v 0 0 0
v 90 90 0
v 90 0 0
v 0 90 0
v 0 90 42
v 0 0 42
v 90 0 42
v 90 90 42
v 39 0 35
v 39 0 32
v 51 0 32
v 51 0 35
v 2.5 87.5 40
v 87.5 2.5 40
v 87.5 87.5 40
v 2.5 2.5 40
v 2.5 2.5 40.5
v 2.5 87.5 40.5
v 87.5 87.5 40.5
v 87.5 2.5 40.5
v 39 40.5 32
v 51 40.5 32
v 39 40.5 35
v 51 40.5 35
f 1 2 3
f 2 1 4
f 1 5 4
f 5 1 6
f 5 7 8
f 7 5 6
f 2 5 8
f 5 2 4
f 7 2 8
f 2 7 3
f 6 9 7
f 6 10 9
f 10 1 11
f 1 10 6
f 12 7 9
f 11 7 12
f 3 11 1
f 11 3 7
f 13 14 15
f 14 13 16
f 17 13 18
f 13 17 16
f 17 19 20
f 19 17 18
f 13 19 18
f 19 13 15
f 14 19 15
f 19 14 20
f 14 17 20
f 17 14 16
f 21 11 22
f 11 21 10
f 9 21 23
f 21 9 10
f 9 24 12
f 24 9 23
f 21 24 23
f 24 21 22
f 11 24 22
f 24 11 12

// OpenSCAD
// Magnetic stirrer housing for an 80 mm PC case fan
// Print orientation: top plate on bed (z = 0), walls rise to z = 40, open top

// ---------- Parameters ----------
top_thickness      = 2;     // top plate thickness
wall_thickness     = 2.5;   // wall thickness
box_height         = 40;    // total height of walls (open top at z = 40)
outer_size         = 90;    // outer X and Y size of box
hole_count         = 4;     // number of mounting holes in top plate
hole_size          = 4.5;   // mounting hole diameter (M4)
hole_pitch         = 71.5;  // square pattern pitch between hole centres
notch_width        = 12;    // cable notch width, centred along one wall
notch_depth        = 8;     // notch depth from open edge (z = 32 to z = 40)
eps                = 0.5;   // overcut for clean boolean differences

$fn = 96;

// ---------- Derived ----------
inner_size = outer_size - 2 * wall_thickness;   // 85 x 85 mm open area
floor     = [outer_size, outer_size, 0];        // outer floor of top plate
ceiling   = [inner_size, inner_size, top_thickness]; // inner ceiling of top plate

// ---------- Model ----------
difference() {
    // Solid box: top plate + walls, open at the top
    translate([0, 0, 0])
        linear_extrude(height = box_height + top_thickness)
            square(outer_size);

    // Open the top: cut through the walls above z = box_height
    translate([wall_thickness, wall_thickness, box_height])
        linear_extrude(height = eps)
            square(inner_size);

    // Screw holes through the top plate, centred on the plate
    for (i = [0 : hole_count - 1]) {
        a = i * hole_pitch;
        b = (hole_count - 1 - i) * hole_pitch;
        translate([(a - hole_pitch / 2), (b - hole_pitch / 2), 0])
            cylinder(d = hole_size, h = top_thickness + eps);
    }

    // Cable notch in one wall, centred along the wall
    translate([outer_size / 2 - notch_width / 2, 0, box_height - notch_depth])
        linear_extrude(height = wall_thickness + eps)
            square([notch_width, box_height + eps]);
}
